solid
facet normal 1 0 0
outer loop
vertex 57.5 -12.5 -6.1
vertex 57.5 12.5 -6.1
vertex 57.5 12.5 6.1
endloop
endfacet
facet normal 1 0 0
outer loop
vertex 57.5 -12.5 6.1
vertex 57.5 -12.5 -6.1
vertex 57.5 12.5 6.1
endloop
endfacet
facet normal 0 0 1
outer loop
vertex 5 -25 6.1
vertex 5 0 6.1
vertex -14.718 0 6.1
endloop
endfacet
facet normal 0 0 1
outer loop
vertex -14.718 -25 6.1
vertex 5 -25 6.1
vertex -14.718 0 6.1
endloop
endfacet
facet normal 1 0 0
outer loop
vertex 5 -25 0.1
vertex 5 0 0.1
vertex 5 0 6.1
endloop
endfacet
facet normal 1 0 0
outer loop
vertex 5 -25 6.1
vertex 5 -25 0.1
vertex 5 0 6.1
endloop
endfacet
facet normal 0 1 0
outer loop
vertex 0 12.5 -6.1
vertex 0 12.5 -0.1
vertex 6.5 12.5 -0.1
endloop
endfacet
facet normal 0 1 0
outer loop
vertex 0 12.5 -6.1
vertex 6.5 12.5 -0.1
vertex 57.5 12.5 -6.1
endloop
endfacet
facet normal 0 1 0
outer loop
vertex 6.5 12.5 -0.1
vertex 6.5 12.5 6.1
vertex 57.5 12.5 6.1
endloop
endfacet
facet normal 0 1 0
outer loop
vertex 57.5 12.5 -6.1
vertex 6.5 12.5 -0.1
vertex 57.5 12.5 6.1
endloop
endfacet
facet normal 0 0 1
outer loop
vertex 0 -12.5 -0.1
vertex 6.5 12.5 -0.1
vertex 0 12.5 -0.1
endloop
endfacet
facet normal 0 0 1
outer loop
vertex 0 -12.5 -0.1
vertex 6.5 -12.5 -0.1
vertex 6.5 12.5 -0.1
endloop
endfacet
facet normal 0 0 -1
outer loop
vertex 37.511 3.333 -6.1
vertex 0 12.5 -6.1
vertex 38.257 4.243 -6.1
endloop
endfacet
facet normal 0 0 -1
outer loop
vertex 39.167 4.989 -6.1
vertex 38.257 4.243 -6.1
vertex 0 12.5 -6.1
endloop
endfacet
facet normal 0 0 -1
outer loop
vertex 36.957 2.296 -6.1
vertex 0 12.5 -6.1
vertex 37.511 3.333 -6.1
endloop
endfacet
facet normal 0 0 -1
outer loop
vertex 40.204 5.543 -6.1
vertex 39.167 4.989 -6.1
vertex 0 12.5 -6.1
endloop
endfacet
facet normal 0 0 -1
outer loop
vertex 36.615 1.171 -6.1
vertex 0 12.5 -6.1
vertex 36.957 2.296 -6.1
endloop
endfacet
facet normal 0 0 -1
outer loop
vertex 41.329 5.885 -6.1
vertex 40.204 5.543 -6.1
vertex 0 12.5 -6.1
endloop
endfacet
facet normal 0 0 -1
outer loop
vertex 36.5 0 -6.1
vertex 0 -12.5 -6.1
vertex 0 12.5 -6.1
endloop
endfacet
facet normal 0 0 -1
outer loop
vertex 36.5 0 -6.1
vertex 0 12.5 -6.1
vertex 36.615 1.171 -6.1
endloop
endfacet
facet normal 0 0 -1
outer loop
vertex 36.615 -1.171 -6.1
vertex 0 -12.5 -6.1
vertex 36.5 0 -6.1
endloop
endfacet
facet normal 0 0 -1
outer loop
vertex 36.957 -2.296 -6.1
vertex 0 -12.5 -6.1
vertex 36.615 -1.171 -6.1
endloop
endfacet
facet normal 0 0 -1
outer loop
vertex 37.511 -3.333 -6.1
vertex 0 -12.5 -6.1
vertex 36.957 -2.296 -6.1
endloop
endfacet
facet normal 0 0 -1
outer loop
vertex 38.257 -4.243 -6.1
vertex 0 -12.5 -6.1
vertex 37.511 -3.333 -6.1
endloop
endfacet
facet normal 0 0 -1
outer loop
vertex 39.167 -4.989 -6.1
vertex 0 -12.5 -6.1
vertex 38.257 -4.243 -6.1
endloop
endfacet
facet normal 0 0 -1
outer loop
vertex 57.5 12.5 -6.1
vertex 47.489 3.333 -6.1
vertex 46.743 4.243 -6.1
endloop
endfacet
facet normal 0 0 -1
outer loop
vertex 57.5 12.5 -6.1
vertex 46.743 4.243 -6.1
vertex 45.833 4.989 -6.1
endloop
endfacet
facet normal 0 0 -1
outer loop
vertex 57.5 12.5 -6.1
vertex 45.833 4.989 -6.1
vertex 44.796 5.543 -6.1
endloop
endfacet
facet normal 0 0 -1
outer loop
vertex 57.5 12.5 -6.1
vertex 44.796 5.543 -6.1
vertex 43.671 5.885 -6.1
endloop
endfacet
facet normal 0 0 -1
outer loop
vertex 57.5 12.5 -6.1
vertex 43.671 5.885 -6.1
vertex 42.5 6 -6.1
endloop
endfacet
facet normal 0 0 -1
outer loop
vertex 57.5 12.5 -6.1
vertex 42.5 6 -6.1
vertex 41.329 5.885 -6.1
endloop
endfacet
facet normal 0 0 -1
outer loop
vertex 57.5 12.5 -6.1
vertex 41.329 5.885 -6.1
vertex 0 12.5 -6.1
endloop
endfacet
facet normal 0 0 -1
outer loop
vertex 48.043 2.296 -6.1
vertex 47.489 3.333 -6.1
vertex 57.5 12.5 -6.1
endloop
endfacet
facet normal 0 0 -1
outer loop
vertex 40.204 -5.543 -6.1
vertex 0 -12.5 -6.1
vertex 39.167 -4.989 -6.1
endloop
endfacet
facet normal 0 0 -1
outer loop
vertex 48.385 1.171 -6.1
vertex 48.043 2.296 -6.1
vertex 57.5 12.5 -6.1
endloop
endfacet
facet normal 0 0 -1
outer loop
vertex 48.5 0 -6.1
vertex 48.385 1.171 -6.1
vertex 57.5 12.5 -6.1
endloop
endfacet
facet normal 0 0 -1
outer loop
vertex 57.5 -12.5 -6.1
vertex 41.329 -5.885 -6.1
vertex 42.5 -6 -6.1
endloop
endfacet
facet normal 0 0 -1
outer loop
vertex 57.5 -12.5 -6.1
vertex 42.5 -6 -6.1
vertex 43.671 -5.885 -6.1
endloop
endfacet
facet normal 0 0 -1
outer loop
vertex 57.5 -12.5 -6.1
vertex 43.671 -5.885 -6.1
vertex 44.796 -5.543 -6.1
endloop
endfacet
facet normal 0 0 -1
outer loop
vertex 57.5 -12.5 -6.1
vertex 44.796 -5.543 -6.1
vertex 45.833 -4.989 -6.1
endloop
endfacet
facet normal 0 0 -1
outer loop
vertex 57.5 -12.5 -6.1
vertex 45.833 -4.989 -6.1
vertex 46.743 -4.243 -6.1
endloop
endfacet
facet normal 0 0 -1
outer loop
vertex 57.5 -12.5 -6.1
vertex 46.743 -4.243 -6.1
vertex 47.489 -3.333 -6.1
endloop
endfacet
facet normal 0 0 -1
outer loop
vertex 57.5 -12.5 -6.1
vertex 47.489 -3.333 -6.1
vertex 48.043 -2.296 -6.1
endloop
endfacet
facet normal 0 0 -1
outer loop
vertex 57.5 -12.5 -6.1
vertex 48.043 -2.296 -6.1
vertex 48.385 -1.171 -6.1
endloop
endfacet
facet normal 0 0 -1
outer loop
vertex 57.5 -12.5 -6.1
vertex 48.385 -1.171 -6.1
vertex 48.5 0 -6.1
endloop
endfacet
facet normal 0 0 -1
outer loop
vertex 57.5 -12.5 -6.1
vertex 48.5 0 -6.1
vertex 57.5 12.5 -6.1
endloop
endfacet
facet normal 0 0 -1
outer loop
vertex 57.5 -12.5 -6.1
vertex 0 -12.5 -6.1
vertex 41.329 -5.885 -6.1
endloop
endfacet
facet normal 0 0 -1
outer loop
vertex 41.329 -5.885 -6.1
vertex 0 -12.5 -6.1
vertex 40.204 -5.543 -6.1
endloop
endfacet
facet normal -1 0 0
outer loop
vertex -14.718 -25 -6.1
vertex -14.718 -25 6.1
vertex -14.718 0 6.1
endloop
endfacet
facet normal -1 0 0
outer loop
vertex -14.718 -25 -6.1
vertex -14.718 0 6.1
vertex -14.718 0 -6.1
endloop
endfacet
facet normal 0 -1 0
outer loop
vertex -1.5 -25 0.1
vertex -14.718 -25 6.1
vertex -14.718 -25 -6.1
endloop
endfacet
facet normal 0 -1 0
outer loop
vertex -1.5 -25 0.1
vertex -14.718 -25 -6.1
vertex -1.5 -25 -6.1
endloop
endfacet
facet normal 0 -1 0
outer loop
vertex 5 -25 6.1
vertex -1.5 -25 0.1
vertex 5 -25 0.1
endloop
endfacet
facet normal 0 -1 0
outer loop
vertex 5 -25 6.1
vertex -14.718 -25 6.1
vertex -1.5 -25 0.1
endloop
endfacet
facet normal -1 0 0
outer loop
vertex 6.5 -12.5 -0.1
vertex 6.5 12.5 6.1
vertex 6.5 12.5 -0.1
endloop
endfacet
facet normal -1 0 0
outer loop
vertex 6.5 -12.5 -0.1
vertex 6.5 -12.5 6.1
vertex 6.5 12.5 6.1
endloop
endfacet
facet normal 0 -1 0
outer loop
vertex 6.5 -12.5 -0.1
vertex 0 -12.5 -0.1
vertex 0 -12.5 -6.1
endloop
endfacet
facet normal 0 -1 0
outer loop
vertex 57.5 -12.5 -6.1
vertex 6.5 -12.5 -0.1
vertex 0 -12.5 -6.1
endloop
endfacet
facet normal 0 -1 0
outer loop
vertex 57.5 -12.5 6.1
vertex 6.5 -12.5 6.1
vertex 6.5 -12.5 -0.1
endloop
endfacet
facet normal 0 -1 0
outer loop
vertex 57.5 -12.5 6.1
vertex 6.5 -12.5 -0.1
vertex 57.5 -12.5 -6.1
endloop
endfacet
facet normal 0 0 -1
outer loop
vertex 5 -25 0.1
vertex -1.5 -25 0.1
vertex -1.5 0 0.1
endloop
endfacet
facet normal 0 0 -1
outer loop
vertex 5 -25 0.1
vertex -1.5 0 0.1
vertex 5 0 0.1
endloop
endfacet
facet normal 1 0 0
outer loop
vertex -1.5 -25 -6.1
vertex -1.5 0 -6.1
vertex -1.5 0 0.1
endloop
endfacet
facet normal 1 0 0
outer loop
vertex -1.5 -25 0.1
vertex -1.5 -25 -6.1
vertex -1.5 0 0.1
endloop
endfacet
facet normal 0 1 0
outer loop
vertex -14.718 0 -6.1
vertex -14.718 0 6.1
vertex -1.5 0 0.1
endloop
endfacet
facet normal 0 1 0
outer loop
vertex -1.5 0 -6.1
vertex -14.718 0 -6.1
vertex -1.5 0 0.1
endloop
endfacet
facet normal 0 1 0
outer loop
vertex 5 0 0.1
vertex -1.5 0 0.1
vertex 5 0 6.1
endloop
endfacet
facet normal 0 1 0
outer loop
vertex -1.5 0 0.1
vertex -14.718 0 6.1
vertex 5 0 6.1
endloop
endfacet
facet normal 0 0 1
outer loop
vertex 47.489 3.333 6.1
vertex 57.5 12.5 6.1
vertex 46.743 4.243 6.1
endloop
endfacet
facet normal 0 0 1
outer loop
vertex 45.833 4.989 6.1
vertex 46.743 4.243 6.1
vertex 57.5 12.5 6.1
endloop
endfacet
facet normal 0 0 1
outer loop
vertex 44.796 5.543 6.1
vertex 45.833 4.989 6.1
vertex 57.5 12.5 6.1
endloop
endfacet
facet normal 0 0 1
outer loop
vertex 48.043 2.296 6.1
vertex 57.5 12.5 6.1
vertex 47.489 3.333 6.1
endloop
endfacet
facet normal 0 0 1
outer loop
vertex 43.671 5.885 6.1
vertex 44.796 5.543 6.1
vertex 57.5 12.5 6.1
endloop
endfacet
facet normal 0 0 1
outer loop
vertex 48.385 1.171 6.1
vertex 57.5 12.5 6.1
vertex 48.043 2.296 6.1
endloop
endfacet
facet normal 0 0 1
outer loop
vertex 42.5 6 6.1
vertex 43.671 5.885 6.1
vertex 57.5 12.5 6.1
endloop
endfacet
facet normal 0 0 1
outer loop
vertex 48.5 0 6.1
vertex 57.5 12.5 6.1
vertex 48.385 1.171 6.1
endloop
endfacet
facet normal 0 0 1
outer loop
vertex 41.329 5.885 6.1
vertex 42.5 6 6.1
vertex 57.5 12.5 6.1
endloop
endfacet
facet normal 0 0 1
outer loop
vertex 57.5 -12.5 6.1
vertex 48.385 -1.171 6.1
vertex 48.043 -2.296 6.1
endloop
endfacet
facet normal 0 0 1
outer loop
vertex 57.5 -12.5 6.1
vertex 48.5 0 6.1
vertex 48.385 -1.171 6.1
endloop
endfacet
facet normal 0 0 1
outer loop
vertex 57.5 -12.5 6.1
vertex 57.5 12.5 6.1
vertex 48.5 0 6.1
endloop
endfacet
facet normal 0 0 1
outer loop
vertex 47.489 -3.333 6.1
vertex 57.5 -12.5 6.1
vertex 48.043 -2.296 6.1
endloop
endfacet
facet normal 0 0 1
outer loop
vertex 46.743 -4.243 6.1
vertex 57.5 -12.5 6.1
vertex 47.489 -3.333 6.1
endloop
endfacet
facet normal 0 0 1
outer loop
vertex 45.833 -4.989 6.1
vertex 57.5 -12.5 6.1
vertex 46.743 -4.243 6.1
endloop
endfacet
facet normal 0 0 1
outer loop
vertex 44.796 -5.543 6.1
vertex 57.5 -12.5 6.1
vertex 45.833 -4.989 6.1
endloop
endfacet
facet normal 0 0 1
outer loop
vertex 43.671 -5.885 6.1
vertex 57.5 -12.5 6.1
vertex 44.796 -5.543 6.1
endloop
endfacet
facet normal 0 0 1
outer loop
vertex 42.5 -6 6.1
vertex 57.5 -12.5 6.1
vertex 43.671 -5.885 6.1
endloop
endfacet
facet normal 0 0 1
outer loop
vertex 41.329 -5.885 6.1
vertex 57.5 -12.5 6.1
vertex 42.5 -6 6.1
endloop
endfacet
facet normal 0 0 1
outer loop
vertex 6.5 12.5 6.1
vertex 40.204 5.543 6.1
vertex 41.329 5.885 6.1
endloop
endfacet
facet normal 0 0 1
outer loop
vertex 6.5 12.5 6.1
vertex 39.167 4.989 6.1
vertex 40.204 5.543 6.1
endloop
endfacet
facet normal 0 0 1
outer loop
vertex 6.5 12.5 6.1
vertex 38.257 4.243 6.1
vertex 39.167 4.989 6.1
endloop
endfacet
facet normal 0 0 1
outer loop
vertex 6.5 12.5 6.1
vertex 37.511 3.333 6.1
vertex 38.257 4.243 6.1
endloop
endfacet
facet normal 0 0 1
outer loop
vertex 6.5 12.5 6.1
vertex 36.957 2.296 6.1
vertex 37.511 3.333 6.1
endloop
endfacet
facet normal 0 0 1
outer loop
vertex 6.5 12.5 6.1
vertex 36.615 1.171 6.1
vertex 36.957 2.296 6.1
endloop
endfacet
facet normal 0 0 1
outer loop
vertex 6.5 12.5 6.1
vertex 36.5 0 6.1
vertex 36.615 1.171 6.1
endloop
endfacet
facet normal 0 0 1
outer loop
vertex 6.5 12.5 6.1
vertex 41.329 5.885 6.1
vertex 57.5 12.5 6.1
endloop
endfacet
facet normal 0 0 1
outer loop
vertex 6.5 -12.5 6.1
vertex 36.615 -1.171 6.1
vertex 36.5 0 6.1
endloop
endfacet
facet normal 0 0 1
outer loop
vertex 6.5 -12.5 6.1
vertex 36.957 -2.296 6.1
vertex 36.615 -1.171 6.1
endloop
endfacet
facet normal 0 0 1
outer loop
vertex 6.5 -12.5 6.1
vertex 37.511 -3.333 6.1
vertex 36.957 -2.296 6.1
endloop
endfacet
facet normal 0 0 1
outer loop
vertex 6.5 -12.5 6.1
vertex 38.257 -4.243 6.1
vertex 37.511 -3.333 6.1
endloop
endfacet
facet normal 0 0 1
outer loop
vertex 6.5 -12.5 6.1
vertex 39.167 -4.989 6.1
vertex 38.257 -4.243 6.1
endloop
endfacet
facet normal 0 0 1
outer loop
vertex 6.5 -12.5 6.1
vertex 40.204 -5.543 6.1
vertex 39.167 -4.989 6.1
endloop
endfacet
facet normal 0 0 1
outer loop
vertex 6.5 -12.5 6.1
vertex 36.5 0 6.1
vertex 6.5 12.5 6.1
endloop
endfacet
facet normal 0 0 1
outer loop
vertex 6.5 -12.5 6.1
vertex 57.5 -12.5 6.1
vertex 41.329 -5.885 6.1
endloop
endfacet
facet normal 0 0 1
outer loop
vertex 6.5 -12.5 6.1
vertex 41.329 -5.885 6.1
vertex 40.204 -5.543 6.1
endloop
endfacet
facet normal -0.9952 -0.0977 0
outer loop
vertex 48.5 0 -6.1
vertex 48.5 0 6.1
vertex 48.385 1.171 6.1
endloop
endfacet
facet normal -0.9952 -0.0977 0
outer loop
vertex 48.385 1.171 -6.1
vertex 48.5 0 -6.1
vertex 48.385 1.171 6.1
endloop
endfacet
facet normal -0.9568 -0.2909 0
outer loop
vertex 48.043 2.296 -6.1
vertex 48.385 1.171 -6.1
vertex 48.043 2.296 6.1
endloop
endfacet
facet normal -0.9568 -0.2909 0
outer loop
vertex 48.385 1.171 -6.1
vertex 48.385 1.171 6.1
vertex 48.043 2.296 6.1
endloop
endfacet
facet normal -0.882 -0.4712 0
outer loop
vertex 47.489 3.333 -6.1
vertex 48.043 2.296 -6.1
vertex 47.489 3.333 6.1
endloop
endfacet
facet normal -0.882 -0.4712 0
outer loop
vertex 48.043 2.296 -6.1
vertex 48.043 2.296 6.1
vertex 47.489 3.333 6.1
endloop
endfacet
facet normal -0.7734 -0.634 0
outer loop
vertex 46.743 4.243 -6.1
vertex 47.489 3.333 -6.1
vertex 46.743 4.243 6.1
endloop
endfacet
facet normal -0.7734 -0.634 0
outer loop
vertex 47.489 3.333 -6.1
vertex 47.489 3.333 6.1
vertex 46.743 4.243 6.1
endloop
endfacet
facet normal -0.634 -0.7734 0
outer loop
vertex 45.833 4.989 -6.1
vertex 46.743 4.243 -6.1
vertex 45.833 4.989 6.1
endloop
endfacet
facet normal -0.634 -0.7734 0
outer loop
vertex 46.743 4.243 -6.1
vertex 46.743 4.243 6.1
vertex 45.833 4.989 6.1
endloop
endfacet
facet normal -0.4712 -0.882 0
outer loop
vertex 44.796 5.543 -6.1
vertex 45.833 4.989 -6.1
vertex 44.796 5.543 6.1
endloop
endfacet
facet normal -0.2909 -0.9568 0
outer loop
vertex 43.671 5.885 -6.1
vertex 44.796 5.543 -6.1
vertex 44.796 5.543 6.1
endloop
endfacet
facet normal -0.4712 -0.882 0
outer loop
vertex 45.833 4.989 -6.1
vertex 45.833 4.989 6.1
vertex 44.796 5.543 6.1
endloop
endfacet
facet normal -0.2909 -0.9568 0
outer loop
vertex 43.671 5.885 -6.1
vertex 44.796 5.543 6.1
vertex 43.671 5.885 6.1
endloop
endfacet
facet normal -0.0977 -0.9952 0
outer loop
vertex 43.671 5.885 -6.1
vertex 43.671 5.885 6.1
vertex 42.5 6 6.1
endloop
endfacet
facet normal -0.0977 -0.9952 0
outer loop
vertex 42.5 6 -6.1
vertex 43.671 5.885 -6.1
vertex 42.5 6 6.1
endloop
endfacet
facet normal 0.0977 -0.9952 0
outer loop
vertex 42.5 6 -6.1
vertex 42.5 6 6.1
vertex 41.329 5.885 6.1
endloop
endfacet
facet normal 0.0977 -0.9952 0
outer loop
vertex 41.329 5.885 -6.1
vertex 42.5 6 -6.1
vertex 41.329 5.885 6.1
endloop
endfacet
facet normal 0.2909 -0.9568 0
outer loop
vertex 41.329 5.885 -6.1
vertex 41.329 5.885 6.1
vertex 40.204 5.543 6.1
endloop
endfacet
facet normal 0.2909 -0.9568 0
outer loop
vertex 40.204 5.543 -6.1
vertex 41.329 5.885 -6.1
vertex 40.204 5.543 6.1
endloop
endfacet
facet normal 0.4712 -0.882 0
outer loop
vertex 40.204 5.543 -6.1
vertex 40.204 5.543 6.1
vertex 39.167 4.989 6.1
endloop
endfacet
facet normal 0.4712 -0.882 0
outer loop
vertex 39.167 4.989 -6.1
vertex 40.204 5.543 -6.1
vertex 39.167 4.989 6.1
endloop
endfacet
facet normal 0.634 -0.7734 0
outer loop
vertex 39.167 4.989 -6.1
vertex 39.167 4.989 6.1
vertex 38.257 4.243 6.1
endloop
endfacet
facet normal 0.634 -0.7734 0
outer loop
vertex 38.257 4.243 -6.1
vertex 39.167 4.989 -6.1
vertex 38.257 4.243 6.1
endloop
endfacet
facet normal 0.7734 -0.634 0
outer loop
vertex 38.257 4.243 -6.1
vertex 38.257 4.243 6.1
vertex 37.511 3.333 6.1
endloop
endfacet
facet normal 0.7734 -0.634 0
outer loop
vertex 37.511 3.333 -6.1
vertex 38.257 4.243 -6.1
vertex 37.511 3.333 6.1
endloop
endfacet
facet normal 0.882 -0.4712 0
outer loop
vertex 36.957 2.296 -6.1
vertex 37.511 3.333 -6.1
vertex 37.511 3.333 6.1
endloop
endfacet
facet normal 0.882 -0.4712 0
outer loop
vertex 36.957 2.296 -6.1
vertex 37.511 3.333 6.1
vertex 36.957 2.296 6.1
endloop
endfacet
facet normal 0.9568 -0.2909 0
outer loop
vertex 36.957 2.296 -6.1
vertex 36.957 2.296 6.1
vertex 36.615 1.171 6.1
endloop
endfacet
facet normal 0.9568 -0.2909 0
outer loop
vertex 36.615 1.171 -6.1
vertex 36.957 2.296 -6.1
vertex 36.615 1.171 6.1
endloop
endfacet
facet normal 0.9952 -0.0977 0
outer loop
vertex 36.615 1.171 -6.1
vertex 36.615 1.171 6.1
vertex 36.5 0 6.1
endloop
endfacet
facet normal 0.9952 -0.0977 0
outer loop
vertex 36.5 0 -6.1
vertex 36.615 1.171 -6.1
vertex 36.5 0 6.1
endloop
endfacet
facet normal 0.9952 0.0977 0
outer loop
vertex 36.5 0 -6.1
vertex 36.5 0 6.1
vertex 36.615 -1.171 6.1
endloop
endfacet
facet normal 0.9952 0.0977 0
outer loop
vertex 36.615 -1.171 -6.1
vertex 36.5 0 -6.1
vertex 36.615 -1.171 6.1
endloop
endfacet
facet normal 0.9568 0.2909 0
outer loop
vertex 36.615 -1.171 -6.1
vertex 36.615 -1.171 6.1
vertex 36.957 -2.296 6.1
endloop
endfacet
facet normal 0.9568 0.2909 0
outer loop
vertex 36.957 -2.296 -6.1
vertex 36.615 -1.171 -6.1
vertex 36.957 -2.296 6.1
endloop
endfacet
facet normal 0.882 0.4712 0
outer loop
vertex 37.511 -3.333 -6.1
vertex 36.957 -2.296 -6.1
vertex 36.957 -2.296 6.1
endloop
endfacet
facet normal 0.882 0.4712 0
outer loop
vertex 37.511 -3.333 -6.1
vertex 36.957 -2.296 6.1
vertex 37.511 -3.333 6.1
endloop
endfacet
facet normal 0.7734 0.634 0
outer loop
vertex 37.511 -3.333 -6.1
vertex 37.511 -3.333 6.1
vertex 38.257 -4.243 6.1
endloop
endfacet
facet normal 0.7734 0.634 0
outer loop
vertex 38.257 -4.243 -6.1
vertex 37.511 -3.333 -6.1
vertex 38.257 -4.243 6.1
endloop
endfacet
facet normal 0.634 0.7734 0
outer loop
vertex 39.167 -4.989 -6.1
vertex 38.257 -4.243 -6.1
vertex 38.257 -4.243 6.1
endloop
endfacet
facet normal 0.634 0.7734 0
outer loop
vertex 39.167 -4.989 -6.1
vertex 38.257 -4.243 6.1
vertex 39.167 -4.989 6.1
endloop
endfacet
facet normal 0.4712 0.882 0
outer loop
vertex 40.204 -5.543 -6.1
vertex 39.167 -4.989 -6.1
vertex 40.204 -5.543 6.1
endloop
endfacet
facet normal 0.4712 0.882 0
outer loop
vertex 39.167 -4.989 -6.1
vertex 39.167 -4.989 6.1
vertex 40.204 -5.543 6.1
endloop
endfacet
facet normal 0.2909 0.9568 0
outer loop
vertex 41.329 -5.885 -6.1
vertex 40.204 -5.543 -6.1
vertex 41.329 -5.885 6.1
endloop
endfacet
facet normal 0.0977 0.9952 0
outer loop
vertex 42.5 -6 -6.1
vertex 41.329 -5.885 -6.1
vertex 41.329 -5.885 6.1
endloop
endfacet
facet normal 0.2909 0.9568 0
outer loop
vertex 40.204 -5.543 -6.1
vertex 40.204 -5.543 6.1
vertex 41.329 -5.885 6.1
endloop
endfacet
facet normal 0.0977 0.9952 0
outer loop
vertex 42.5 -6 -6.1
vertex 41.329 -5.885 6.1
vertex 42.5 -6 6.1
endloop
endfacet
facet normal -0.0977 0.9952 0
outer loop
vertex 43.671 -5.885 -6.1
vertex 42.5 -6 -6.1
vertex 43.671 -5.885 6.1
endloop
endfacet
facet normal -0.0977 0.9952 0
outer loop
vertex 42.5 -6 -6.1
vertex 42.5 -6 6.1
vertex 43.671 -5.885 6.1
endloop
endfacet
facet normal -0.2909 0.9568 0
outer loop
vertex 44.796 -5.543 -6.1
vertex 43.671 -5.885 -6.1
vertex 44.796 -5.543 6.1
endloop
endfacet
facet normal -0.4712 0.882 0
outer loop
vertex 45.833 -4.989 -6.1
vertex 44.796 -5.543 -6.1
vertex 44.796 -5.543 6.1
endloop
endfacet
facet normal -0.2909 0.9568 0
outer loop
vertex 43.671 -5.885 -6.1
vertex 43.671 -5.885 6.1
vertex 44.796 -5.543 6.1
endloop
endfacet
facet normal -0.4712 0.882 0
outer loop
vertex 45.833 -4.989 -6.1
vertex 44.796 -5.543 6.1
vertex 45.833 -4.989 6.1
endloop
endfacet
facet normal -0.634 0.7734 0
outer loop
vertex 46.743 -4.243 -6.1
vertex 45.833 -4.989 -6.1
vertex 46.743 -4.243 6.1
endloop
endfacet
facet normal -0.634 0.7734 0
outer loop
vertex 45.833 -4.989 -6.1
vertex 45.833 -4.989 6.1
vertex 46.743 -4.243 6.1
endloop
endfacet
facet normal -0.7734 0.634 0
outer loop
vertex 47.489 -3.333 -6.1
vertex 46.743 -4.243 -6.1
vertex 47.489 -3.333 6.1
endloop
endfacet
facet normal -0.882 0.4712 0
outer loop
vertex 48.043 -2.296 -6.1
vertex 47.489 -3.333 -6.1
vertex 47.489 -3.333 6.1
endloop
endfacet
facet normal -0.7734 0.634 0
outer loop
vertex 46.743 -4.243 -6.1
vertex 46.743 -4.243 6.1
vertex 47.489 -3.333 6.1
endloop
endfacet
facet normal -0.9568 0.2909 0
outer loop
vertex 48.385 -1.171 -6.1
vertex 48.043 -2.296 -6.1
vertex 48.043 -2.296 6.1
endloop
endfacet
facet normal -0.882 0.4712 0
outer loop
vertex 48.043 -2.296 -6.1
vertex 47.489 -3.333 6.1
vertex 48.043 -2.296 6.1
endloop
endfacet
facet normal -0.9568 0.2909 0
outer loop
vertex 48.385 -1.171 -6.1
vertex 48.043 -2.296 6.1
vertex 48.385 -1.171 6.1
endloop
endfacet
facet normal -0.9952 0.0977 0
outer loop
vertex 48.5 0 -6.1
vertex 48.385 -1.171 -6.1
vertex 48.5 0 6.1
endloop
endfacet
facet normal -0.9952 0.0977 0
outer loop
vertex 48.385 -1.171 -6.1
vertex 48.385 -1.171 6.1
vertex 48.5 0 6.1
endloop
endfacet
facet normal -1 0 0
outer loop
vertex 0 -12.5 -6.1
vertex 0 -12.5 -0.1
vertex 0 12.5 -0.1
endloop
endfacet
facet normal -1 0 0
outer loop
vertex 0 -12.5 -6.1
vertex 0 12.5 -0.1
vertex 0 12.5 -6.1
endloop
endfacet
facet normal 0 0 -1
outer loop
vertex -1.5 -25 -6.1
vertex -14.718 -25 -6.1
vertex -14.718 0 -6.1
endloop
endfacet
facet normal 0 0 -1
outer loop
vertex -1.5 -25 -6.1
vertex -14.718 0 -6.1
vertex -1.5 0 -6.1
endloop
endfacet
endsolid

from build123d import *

# Parameters (mm, degrees)
F1_DEPTH = 12.5
F2_R     = 6
F3_DEPTH = 12.201
F5_DEPTH = 25


with BuildPart() as f1:
    # F0 (on Front) → F1 (new body, symmetric)
    with BuildSketch(Plane.XZ):
        Polygon((6.5, -0.1), (0, -0.1), (0, -6.1), (57.5, -6.1), (57.5, 6.1), (6.5, 6.1), align=None)
    extrude(amount=F1_DEPTH, both=True)

    # F2 (on face) → F3 (cut, through all)
    with BuildSketch(Plane.XY.offset(6.1)):
        with Locations((42.5, 0)):
            Circle(F2_R)
    extrude(amount=-F3_DEPTH, mode=Mode.SUBTRACT)


with BuildPart() as f5:
    # F4 (on Front) → F5 (new body)
    with BuildSketch(Plane.XZ):
        Polygon((-1.5, 0.1), (5, 0.1), (5, 6.1), (-14.718099, 6.1), (-14.718099, -6.1), (-1.5, -6.1), align=None)
    extrude(amount=F5_DEPTH)


solid = Compound([f1.part, f5.part])
